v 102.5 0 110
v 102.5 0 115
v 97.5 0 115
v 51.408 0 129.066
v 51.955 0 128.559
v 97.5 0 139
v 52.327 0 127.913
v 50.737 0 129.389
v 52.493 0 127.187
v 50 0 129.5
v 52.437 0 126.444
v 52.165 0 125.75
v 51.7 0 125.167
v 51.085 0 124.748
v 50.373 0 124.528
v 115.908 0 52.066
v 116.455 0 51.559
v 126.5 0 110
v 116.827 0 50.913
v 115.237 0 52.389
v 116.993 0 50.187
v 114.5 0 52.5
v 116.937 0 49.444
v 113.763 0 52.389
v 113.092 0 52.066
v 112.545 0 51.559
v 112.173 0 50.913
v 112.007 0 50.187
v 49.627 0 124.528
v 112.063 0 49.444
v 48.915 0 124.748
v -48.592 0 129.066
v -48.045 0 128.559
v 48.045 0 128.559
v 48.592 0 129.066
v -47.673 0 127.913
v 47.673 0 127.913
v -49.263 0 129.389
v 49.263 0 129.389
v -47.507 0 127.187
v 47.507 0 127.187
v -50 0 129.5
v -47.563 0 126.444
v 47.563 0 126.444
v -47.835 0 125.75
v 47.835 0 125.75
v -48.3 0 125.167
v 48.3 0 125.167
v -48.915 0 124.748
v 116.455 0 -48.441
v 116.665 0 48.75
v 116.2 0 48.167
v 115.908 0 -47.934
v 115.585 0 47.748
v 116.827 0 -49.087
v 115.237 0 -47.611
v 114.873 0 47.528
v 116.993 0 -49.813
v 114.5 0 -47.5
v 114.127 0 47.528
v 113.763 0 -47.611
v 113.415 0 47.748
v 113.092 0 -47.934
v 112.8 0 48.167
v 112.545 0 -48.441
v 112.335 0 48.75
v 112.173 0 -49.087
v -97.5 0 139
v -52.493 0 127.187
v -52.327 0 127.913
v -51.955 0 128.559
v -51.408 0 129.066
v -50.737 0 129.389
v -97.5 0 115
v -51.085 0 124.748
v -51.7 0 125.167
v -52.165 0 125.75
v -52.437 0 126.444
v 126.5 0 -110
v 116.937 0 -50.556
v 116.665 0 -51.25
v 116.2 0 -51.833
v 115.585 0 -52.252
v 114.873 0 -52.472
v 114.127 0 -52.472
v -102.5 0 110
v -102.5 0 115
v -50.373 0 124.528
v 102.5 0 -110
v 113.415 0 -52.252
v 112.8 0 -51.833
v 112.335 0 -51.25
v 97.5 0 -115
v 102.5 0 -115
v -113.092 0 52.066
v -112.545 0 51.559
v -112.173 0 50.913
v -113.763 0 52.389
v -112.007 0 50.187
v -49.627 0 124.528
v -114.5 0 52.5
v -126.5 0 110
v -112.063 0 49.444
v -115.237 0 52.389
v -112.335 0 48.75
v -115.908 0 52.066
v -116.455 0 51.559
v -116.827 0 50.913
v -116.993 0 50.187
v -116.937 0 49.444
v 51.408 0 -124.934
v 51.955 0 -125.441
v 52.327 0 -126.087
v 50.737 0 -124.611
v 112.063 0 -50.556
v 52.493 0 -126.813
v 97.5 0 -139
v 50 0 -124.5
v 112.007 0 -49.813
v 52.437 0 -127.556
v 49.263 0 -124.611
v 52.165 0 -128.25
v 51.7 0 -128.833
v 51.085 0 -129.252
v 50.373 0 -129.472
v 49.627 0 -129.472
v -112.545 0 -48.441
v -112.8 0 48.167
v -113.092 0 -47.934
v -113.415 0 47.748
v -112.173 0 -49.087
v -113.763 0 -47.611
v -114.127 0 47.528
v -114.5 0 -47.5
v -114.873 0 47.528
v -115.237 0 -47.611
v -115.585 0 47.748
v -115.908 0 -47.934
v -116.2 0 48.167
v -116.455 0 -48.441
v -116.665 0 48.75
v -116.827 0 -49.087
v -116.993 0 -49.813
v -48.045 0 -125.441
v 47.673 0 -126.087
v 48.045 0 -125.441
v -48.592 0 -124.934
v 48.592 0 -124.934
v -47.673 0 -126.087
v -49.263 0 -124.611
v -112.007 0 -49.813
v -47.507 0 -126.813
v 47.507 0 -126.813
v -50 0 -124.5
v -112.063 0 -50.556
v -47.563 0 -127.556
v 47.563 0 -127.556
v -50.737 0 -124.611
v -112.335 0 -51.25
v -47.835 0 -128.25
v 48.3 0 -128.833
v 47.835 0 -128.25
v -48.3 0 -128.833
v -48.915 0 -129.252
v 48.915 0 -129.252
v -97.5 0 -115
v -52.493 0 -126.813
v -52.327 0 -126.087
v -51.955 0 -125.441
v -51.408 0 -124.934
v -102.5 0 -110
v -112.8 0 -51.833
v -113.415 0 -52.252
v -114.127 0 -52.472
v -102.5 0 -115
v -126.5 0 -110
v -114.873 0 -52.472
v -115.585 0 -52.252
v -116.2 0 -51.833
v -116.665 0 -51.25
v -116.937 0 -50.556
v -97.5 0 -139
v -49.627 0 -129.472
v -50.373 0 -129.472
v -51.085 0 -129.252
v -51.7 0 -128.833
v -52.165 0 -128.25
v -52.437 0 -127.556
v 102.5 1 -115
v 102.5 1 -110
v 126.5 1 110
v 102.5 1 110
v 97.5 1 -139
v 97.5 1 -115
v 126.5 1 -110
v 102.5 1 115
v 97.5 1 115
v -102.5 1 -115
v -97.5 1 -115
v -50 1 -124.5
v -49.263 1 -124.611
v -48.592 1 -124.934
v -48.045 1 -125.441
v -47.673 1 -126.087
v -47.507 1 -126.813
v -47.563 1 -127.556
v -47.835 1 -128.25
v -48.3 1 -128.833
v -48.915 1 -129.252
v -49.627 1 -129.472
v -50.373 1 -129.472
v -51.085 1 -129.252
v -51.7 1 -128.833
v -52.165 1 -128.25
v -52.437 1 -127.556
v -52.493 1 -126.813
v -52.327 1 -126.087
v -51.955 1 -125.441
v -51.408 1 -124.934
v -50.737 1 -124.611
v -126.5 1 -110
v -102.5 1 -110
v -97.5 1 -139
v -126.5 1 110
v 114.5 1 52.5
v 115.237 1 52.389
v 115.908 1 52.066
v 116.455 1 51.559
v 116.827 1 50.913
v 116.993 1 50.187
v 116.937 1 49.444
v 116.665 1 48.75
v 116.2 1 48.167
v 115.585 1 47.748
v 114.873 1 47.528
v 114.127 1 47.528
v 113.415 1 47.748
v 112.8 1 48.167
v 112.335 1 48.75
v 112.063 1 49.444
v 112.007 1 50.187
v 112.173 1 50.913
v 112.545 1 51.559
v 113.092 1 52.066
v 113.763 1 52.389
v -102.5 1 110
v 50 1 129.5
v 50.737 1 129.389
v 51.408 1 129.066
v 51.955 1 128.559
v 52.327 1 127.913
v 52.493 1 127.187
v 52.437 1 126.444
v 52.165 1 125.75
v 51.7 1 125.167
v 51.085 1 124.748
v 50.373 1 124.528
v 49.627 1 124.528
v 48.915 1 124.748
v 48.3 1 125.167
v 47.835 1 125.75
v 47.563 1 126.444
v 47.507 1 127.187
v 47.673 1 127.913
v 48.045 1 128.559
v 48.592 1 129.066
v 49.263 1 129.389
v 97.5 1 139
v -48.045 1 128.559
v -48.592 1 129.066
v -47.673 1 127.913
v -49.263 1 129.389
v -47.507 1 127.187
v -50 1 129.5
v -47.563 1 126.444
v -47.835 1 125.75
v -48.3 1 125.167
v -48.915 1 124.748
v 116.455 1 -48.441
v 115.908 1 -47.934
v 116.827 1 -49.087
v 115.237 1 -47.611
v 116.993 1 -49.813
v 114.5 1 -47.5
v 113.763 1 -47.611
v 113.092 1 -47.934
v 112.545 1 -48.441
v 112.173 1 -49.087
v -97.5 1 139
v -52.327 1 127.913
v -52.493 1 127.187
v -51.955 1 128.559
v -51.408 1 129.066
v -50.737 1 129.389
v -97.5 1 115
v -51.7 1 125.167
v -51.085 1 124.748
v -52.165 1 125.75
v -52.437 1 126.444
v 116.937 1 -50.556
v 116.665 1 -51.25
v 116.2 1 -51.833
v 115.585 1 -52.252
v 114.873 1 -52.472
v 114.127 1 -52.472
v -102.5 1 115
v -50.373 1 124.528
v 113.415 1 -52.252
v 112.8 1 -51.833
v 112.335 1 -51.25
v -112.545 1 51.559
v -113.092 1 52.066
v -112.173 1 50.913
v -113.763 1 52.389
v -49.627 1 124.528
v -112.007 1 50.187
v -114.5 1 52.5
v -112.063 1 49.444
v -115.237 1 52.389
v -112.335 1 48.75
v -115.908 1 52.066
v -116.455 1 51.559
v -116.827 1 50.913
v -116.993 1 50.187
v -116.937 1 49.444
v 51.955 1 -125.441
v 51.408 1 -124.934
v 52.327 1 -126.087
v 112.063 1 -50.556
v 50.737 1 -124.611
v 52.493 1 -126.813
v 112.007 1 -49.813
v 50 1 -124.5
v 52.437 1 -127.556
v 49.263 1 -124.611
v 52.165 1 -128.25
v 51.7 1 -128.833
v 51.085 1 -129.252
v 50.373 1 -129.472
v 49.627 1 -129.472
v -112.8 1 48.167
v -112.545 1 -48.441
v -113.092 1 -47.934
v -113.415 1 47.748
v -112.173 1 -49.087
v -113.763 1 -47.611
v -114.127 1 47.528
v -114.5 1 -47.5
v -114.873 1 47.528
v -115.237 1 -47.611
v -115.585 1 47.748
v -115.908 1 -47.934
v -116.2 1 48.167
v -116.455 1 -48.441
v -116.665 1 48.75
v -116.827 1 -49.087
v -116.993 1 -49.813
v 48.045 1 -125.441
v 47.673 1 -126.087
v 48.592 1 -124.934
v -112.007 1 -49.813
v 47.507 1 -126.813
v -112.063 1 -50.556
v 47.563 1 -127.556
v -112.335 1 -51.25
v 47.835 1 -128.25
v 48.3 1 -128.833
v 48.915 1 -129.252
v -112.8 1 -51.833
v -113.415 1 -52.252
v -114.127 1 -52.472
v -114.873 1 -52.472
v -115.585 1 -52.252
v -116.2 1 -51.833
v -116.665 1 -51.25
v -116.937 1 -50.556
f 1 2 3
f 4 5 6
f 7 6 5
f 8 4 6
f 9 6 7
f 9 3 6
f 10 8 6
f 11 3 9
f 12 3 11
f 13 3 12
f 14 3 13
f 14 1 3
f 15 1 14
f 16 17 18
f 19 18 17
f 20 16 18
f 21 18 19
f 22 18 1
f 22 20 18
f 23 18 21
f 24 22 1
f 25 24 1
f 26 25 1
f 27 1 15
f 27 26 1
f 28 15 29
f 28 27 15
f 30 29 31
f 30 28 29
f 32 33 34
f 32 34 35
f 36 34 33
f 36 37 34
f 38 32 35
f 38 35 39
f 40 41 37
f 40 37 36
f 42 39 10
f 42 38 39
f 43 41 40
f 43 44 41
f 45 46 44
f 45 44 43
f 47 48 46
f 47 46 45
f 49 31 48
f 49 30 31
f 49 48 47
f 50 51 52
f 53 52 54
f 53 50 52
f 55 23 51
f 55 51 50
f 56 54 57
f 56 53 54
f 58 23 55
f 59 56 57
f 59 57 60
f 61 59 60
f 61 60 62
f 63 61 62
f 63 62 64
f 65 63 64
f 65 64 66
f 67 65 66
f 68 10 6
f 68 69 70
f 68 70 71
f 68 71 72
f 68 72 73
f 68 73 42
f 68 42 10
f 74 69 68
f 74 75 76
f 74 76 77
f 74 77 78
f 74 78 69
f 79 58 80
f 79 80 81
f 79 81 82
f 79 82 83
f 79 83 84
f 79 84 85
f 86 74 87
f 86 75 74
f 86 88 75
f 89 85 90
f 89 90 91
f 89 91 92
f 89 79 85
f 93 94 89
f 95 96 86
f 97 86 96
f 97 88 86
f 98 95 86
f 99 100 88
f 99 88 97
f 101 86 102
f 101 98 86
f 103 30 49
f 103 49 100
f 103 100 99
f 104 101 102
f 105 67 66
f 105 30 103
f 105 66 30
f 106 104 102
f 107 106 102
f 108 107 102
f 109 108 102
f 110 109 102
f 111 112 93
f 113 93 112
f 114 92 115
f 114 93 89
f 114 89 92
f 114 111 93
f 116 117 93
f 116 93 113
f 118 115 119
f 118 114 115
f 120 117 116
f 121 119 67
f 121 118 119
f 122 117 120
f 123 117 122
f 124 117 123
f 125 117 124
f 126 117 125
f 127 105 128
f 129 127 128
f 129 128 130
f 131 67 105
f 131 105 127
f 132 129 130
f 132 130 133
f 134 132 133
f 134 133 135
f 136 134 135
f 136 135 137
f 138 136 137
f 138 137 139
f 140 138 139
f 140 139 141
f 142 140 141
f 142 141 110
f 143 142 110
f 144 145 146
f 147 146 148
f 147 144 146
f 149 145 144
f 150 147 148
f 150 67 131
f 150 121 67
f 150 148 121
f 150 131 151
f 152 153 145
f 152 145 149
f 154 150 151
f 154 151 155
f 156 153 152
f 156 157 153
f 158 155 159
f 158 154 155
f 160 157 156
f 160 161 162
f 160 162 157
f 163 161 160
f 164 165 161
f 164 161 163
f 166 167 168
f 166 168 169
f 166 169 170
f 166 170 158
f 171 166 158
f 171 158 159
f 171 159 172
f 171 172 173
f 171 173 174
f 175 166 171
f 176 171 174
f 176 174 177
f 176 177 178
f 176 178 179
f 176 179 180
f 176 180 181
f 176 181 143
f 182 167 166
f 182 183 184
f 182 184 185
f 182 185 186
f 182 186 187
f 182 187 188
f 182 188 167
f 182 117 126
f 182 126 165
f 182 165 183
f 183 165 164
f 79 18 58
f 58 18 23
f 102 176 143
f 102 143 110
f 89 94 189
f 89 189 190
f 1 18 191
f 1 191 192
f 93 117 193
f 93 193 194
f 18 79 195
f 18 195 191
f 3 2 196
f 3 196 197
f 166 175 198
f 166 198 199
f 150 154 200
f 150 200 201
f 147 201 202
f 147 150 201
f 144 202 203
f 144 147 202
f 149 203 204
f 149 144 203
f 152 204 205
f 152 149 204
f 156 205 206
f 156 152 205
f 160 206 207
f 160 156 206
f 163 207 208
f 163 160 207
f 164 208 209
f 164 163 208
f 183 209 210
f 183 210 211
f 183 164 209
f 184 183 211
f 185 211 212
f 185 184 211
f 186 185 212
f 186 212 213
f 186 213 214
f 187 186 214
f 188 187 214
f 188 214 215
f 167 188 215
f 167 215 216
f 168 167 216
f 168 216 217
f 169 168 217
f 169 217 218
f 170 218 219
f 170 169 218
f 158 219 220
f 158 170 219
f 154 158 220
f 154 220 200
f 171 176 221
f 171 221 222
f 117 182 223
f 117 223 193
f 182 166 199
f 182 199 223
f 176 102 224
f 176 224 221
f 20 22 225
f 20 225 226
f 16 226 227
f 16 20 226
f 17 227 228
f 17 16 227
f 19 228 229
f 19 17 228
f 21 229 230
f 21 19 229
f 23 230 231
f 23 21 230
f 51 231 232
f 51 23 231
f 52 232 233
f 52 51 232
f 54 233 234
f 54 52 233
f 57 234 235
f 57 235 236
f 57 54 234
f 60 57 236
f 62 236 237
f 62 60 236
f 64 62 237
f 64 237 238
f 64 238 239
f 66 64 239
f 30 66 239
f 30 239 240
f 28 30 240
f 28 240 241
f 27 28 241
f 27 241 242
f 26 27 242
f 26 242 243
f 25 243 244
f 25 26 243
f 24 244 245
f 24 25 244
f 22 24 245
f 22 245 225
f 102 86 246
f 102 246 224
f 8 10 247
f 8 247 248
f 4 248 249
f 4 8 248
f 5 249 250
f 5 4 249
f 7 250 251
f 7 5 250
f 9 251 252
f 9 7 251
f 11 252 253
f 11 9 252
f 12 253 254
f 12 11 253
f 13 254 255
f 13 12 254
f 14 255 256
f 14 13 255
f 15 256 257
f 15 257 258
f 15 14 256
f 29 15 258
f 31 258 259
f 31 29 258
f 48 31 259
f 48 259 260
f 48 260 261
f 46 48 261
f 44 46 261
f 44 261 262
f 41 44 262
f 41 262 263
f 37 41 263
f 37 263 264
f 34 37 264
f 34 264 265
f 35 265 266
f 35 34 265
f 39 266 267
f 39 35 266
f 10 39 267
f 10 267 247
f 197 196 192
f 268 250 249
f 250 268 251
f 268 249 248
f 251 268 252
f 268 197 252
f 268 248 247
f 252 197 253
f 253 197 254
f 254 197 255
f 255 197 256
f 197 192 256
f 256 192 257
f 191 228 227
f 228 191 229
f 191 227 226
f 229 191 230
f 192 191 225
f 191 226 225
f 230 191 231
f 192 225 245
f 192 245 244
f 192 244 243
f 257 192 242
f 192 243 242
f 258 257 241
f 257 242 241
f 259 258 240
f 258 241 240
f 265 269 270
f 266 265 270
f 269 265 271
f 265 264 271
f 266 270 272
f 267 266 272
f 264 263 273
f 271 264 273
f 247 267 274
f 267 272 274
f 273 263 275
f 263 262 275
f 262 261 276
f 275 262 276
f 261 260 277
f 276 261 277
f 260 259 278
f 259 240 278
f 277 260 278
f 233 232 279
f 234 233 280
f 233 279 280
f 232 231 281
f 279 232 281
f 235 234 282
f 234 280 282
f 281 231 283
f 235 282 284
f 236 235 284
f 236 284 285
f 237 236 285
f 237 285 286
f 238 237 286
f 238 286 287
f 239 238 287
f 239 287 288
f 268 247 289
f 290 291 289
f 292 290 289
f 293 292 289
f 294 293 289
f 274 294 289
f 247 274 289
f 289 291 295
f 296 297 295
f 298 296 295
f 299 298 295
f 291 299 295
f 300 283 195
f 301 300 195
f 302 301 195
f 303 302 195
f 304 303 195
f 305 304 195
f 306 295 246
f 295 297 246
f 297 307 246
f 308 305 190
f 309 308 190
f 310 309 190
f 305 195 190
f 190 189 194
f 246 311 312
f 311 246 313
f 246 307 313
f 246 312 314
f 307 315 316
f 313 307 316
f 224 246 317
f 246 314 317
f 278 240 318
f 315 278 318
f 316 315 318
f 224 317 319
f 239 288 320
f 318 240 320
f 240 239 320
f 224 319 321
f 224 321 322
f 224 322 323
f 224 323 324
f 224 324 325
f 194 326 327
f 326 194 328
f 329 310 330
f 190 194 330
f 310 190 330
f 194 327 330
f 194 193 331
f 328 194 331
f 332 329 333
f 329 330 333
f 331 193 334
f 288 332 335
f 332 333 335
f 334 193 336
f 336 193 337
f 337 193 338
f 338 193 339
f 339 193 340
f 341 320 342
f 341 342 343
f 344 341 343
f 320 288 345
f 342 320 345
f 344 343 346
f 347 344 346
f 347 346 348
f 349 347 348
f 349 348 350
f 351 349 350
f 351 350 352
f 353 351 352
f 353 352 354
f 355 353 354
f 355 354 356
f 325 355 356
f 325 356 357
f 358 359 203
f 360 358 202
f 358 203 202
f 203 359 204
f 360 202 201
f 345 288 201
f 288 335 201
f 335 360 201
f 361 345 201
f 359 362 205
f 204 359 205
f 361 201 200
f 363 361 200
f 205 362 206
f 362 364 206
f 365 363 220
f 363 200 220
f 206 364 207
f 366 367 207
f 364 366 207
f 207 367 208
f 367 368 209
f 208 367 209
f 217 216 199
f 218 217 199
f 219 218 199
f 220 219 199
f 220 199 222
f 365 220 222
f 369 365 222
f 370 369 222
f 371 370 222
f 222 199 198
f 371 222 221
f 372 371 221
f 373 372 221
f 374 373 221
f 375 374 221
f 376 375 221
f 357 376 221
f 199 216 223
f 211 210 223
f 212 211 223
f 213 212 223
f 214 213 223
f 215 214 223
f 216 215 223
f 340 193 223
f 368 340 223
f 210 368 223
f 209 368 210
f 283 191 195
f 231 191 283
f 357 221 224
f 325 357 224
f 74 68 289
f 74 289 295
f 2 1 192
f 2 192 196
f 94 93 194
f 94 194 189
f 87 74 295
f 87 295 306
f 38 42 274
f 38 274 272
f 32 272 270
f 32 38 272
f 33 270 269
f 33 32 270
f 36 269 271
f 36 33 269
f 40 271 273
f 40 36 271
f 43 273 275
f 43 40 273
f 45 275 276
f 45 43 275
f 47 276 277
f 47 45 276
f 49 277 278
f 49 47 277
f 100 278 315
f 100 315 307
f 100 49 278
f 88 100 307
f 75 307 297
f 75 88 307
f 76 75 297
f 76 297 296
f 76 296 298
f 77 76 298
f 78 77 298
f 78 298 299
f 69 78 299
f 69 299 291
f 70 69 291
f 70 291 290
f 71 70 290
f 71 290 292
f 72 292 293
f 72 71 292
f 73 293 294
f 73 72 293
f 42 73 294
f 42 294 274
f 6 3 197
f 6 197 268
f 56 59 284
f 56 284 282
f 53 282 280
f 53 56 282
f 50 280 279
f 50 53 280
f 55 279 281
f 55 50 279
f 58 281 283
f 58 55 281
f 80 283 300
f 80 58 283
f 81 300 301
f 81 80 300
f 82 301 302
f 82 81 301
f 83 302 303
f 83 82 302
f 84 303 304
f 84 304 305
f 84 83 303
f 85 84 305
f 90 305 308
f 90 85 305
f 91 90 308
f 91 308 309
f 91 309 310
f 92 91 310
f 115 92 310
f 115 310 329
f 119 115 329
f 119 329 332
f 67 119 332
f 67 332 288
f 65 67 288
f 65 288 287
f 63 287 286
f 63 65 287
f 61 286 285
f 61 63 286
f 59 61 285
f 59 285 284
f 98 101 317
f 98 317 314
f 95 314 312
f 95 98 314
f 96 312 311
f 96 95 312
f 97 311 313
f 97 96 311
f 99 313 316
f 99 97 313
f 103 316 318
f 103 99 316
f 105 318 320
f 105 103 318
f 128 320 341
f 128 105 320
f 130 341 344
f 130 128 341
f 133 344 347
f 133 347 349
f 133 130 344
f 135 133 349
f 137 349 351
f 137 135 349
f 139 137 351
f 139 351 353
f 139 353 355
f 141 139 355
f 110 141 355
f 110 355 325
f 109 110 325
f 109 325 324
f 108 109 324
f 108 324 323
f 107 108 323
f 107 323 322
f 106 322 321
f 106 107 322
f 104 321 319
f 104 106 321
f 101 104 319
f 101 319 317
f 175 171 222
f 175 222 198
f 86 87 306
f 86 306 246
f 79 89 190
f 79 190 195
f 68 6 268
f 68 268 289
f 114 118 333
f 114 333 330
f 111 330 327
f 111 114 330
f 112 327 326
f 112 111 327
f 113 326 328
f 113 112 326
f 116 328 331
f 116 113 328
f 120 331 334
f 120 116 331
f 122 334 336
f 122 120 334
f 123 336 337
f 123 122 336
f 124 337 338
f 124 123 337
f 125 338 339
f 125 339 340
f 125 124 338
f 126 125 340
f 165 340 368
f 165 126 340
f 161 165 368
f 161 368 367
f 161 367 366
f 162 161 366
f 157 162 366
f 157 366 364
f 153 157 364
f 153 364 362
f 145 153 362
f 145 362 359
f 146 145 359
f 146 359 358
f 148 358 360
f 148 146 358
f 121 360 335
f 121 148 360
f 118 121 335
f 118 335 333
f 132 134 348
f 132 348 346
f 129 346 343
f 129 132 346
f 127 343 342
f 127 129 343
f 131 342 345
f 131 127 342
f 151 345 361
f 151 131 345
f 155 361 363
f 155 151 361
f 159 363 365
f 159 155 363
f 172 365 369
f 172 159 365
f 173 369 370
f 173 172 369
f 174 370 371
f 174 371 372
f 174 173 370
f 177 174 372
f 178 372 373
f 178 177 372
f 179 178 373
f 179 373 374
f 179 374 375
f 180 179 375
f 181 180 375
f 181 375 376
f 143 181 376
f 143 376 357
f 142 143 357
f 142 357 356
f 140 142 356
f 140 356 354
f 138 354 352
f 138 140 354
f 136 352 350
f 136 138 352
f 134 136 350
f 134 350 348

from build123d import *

# Parameters (mm, degrees)
SKETCH1_R           = 2.5
BOSS_EXTRUDE1_DEPTH = 1


with BuildPart() as part:
    # Sketch1 → Boss-Extrude1 (new body)
    with BuildSketch(Plane(origin=(0, 0, 0), x_dir=(1, 0, 0), z_dir=(0, 1, 0))):
        Polygon((-102.5, 115), (-97.5, 115), (-97.5, 139), (97.5, 139), (97.5, 115), (102.5, 115), (102.5, 110), (126.5, 110), (126.5, -110), (102.5, -110), (102.5, -115), (97.5, -115), (97.5, -139), (-97.5, -139), (-97.5, -115), (-102.5, -115), (-102.5, -110), (-126.5, -110), (-126.5, 110), (-102.5, 110), align=None)
        with Locations(Location((-114.5, -50, 0), (0, 0, 270))):
            Circle(SKETCH1_R, mode=Mode.SUBTRACT)
        with Locations(Location((-114.5, 50, 0), (0, 0, 270))):
            Circle(SKETCH1_R, mode=Mode.SUBTRACT)
        with Locations(Location((-50, 127, 0), (0, 0, 270))):
            Circle(SKETCH1_R, mode=Mode.SUBTRACT)
        with Locations(Location((50, 127, 0), (0, 0, 270))):
            Circle(SKETCH1_R, mode=Mode.SUBTRACT)
        with Locations(Location((114.5, 50, 0), (0, 0, 270))):
            Circle(SKETCH1_R, mode=Mode.SUBTRACT)
        with Locations(Location((114.5, -50, 0), (0, 0, 270))):
            Circle(SKETCH1_R, mode=Mode.SUBTRACT)
        with Locations(Location((50, -127, 0), (0, 0, 270))):
            Circle(SKETCH1_R, mode=Mode.SUBTRACT)
        with Locations(Location((-50, -127, 0), (0, 0, 270))):
            Circle(SKETCH1_R, mode=Mode.SUBTRACT)
    extrude(amount=BOSS_EXTRUDE1_DEPTH)


solid = part.part
